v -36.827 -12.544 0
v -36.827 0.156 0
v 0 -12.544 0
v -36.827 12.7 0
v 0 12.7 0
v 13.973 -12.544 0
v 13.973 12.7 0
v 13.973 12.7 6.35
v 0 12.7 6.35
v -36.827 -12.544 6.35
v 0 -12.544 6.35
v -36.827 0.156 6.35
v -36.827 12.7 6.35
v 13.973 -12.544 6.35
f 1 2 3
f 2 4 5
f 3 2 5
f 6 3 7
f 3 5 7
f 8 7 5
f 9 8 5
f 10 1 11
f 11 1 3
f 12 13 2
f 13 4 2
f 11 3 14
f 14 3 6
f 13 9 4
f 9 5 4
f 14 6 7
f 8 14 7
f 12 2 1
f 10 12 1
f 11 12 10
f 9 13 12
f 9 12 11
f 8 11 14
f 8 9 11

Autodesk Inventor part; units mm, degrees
ref_plane "YZ Plane" through (0, 0, 0) normal (1, 0, 0) x (0, 1, 0)
ref_plane "XZ Plane" through (0, 0, 0) normal (0, 1, 0) x (-1, 0, 0)
ref_plane "XY Plane" through (0, 0, 0) normal (0, 0, 1) x (1, 0, 0)
sketch "Sketch1" plane through (0, 0, 0) normal (0, 0, 1) x (1, 0, 0)
  circle A0 centre (65.7667, 0.0011) radius 1.1 projected
  line L0 (-36.8269, 0.1559) -> (-36.8269, -12.5441)
  line L1 (-36.8269, -12.5441) -> (0, -12.5441)
  line L2 (0, 12.7) -> (-36.8269, 12.7)
  line L3 (-36.8269, 12.7) -> (-36.8269, -12.5441)
  line L4 (-36.8269, -12.5441) -> (13.9731, -12.5441)
  line L5 (13.9731, -12.5441) -> (13.9731, 12.7)
  line L6 (13.9731, 12.7) -> (-36.8269, 12.7)
  line L7 (-36.8269, 12.7) -> (-36.8269, -12.5441)
  point P0 (0, 0)
  dimension "d0" = 12.7
  dimension "d1" = 12.7
  dimension "d4" = 50.8
extrude "Extrusion2" add sketch "Sketch1" along normal blind 6.35 contours L3 L2 L6 L5 L4 L1 L0
properties part number "ESC"
